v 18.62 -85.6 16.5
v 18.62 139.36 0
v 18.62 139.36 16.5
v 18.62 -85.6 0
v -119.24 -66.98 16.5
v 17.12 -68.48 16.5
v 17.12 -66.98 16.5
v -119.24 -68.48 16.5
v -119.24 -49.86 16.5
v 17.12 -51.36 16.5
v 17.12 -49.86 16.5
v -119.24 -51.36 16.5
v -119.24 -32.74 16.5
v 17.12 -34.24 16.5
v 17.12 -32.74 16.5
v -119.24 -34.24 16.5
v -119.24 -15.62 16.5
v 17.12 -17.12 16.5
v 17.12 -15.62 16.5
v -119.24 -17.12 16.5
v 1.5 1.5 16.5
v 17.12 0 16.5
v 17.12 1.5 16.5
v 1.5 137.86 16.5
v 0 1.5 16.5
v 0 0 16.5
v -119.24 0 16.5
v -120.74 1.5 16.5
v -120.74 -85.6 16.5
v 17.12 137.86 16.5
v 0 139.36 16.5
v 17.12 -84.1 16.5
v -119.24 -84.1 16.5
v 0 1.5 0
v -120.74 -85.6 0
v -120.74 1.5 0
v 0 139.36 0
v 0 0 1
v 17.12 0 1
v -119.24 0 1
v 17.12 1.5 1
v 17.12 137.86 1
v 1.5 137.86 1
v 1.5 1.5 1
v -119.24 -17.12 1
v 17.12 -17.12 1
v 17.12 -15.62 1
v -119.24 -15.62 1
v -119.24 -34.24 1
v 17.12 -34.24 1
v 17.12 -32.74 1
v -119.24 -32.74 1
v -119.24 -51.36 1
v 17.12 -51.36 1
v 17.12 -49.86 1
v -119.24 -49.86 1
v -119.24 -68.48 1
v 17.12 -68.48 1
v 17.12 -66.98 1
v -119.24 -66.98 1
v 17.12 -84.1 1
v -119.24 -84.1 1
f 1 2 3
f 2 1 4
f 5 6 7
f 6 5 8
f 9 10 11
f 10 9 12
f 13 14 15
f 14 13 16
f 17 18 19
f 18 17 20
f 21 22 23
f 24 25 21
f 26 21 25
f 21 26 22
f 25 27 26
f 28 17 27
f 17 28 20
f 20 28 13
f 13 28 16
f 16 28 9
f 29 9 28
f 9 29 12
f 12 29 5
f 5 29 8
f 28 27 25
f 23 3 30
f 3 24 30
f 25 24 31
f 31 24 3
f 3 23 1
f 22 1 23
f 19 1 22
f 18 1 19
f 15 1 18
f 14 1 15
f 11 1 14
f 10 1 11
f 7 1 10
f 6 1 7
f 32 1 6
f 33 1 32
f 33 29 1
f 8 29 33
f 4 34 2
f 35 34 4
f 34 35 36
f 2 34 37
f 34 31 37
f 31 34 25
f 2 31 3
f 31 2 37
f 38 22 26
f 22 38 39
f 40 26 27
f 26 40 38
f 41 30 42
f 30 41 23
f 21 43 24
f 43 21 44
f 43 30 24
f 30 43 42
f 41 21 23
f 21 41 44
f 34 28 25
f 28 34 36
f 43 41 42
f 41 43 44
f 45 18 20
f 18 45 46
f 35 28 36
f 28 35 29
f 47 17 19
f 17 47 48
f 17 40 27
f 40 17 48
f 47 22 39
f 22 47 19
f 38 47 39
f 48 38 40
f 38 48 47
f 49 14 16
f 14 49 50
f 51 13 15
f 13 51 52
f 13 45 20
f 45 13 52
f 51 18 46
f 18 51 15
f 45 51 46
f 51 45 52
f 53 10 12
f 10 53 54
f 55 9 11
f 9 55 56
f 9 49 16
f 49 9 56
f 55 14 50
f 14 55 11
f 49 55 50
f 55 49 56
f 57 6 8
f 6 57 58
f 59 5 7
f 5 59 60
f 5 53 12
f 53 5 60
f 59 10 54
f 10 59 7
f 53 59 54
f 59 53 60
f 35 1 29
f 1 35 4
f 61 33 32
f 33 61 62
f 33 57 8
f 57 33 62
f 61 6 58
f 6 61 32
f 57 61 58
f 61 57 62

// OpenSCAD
//User Variables

now_playing_cover = true;
cover_right_side = true;

num_of_disks = 5;
tolerance = 0.5; //Bambulab P1S PLA = 0.5


//DONT CHANGE THESE
//Variables 
game_width = 15.12 + tolerance;
game_thickness = 135.86 + tolerance;

cover_width = 20;
cover_thickness = 145;

height = 16.5;
walls = 3;
base_thickness = 1;
distance_between_slots = (game_width + (walls / 2));

module game_slot (x, y, is_it_cover) {    
    union() {
        difference() {
            translate([x,y,0]) cube([(game_width + walls), (game_thickness + walls), height]);
            translate([(x+(walls/2)),(y+(walls/2)),0]) cube([game_width, game_thickness, height]);
        }
        translate([x,y,0]) cube([(game_width + walls), (game_thickness + walls), base_thickness]);
    }
}

if (now_playing_cover) {
   if (cover_right_side) {
       game_slot(0,0, true);
   } else {
       game_slot(0,-((game_thickness + (walls / 2)) + (num_of_disks * (game_width + (walls / 2)))), true);
   }
}

for (i = [1:1:num_of_disks]) {
    rotate([0,0,90]) game_slot(-(distance_between_slots*i),-(game_width+walls), false); 
}
